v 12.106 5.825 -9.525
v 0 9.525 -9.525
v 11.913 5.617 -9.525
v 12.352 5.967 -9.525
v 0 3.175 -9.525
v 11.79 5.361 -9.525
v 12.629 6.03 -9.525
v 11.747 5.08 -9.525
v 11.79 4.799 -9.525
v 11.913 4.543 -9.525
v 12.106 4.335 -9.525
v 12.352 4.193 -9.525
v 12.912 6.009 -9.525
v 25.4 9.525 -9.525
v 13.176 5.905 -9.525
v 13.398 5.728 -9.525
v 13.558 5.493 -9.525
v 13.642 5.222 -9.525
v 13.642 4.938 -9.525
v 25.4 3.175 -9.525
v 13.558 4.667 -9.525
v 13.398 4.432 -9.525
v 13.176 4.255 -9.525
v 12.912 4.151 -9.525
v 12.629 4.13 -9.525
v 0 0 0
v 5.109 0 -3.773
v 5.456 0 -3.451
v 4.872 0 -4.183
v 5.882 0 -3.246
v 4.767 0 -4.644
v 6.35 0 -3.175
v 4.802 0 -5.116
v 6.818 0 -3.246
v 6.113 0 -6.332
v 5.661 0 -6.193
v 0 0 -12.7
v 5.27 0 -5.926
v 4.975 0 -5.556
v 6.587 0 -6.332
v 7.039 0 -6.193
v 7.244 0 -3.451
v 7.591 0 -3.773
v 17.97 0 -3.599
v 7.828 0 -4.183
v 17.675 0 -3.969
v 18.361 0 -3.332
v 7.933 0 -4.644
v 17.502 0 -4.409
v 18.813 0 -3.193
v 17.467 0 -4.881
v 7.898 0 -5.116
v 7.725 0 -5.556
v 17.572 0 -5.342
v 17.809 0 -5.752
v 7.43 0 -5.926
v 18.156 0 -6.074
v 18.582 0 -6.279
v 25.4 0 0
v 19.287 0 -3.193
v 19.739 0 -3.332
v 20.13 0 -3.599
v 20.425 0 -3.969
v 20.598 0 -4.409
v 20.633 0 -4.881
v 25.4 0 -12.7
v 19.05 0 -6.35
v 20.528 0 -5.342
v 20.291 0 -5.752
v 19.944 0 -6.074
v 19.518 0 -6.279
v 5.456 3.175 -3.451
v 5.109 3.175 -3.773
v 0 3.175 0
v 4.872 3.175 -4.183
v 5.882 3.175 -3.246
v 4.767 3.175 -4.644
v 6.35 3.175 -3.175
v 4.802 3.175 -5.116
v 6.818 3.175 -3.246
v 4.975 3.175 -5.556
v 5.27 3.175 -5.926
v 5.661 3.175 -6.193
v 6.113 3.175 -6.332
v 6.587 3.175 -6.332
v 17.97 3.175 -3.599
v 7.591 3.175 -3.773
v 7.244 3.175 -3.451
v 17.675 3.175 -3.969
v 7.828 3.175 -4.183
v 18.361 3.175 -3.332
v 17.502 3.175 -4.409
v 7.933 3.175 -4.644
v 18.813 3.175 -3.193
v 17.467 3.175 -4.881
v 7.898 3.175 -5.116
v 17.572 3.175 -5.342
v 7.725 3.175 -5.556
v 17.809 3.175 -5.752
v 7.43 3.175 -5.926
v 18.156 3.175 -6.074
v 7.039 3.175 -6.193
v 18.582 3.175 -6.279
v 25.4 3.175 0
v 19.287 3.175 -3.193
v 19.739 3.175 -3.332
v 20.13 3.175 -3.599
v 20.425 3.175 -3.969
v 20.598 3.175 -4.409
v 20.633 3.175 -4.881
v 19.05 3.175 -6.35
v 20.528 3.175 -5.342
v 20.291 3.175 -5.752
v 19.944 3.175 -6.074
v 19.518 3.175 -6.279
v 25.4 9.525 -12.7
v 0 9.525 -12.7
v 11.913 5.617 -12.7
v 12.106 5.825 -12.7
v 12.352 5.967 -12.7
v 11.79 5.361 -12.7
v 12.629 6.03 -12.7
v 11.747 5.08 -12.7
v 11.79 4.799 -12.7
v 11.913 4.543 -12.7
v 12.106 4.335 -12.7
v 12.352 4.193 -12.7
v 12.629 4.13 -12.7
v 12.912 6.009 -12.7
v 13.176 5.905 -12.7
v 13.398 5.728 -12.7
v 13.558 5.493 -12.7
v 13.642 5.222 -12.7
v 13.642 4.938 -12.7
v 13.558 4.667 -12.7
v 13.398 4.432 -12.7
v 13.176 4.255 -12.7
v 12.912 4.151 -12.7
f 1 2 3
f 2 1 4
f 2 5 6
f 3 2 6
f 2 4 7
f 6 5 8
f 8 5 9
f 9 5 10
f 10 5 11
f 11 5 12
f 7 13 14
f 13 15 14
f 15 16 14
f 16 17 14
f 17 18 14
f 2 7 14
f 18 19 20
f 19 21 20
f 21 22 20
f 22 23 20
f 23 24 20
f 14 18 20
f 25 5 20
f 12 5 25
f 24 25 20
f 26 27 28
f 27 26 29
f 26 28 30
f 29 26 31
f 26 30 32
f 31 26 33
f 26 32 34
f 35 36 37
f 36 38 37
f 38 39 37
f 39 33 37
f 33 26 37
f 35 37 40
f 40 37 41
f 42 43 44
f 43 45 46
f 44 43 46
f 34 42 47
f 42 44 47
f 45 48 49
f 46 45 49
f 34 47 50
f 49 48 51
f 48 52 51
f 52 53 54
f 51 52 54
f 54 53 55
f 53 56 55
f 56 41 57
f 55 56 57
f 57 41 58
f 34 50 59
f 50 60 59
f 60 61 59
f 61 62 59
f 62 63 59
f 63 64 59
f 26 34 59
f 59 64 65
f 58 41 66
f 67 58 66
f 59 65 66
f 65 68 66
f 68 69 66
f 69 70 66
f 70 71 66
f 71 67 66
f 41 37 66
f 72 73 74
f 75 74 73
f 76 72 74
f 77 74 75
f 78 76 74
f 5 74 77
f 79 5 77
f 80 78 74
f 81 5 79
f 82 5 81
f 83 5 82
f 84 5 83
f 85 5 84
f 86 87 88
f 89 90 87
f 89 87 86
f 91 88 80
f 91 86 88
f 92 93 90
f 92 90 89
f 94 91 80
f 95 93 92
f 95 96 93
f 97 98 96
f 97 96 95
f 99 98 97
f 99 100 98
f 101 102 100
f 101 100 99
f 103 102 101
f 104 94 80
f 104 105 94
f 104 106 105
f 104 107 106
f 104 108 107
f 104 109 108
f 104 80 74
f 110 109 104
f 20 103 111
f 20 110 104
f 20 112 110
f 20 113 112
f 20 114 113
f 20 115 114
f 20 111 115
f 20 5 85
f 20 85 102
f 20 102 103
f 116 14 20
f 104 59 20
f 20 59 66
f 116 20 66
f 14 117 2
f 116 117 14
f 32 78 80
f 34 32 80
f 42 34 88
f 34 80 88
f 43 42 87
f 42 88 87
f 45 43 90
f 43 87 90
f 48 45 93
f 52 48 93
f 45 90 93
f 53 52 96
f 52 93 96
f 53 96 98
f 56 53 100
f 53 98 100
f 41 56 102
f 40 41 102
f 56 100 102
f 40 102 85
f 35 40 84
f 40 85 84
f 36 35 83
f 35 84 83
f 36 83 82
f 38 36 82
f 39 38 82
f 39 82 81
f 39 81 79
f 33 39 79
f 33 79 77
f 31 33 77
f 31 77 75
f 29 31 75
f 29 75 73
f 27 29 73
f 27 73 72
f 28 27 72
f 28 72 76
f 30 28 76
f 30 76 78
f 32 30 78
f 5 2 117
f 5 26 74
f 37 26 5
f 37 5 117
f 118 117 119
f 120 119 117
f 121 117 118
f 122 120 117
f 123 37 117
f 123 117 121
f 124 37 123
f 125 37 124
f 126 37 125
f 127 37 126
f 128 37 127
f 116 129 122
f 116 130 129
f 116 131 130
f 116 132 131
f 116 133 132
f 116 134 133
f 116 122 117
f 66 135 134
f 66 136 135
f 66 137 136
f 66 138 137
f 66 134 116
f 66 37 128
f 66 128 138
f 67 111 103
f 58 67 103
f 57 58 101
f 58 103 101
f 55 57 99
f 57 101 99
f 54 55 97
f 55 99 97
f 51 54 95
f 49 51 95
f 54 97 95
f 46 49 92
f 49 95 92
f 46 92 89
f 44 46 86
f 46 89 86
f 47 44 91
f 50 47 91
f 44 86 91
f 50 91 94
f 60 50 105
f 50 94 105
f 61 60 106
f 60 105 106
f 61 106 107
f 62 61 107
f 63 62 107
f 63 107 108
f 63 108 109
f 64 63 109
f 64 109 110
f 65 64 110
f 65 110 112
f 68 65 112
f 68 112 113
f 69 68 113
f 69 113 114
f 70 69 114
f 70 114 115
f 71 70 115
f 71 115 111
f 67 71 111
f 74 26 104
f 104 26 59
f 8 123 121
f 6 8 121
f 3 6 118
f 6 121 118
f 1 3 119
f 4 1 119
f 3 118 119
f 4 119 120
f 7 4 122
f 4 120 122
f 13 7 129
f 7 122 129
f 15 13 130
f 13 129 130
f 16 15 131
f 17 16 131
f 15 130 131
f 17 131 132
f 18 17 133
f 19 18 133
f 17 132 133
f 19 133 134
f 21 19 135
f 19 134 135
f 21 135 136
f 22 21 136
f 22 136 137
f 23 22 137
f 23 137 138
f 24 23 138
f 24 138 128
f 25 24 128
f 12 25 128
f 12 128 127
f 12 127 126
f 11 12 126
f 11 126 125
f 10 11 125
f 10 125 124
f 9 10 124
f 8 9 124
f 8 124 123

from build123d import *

# Parameters (mm, degrees)
SKETCH1_W           = 25.4
SKETCH1_H           = 12.7
BOSS_EXTRUDE1_DEPTH = 3.175
SKETCH2_W           = 25.4
SKETCH2_H           = 3.175
BOSS_EXTRUDE2_DEPTH = 6.35
SKETCH3_R           = 0.9525
CUT_EXTRUDE1_DEPTH  = 30.952890094
SKETCH4_R           = 1.5875
CUT_EXTRUDE2_DEPTH  = 30.099355663


with BuildPart() as part:
    # Sketch1 → Boss-Extrude1 (new body)
    with BuildSketch(Plane(origin=(0, 0, 0), x_dir=(1, 0, 0), z_dir=(0, 1, 0))):
        with Locations((12.7, 6.35)):
            Rectangle(SKETCH1_W, SKETCH1_H)
    extrude(amount=BOSS_EXTRUDE1_DEPTH)

    # Sketch2 → Boss-Extrude2 (add)
    with BuildSketch(Plane(origin=(0, 3.175, 0), x_dir=(1, 0, 0), z_dir=(0, 1, 0))):
        with Locations((12.7, 11.1125)):
            Rectangle(SKETCH2_W, SKETCH2_H)
    extrude(amount=BOSS_EXTRUDE2_DEPTH)

    # Sketch3 → Cut-Extrude1 (cut, through all)
    with BuildSketch(Plane(origin=(0, 0, -12.7), x_dir=(-1, 0, 0), z_dir=(0, 0, -1))):
        with Locations((-12.7, 5.08)):
            Circle(SKETCH3_R)
    extrude(amount=-CUT_EXTRUDE1_DEPTH, mode=Mode.SUBTRACT)

    # Sketch4 → Cut-Extrude2 (cut, through all)
    with BuildSketch(Plane(origin=(0, 3.175, 0), x_dir=(1, 0, 0), z_dir=(0, 1, 0))):
        with Locations(Location((6.35, 4.7625, 0), (0, 0, 270))):
            Circle(SKETCH4_R)
        with Locations(Location((19.05, 4.7625, 0), (0, 0, 90))):
            Circle(SKETCH4_R)
    extrude(amount=-CUT_EXTRUDE2_DEPTH, mode=Mode.SUBTRACT)


solid = part.part
